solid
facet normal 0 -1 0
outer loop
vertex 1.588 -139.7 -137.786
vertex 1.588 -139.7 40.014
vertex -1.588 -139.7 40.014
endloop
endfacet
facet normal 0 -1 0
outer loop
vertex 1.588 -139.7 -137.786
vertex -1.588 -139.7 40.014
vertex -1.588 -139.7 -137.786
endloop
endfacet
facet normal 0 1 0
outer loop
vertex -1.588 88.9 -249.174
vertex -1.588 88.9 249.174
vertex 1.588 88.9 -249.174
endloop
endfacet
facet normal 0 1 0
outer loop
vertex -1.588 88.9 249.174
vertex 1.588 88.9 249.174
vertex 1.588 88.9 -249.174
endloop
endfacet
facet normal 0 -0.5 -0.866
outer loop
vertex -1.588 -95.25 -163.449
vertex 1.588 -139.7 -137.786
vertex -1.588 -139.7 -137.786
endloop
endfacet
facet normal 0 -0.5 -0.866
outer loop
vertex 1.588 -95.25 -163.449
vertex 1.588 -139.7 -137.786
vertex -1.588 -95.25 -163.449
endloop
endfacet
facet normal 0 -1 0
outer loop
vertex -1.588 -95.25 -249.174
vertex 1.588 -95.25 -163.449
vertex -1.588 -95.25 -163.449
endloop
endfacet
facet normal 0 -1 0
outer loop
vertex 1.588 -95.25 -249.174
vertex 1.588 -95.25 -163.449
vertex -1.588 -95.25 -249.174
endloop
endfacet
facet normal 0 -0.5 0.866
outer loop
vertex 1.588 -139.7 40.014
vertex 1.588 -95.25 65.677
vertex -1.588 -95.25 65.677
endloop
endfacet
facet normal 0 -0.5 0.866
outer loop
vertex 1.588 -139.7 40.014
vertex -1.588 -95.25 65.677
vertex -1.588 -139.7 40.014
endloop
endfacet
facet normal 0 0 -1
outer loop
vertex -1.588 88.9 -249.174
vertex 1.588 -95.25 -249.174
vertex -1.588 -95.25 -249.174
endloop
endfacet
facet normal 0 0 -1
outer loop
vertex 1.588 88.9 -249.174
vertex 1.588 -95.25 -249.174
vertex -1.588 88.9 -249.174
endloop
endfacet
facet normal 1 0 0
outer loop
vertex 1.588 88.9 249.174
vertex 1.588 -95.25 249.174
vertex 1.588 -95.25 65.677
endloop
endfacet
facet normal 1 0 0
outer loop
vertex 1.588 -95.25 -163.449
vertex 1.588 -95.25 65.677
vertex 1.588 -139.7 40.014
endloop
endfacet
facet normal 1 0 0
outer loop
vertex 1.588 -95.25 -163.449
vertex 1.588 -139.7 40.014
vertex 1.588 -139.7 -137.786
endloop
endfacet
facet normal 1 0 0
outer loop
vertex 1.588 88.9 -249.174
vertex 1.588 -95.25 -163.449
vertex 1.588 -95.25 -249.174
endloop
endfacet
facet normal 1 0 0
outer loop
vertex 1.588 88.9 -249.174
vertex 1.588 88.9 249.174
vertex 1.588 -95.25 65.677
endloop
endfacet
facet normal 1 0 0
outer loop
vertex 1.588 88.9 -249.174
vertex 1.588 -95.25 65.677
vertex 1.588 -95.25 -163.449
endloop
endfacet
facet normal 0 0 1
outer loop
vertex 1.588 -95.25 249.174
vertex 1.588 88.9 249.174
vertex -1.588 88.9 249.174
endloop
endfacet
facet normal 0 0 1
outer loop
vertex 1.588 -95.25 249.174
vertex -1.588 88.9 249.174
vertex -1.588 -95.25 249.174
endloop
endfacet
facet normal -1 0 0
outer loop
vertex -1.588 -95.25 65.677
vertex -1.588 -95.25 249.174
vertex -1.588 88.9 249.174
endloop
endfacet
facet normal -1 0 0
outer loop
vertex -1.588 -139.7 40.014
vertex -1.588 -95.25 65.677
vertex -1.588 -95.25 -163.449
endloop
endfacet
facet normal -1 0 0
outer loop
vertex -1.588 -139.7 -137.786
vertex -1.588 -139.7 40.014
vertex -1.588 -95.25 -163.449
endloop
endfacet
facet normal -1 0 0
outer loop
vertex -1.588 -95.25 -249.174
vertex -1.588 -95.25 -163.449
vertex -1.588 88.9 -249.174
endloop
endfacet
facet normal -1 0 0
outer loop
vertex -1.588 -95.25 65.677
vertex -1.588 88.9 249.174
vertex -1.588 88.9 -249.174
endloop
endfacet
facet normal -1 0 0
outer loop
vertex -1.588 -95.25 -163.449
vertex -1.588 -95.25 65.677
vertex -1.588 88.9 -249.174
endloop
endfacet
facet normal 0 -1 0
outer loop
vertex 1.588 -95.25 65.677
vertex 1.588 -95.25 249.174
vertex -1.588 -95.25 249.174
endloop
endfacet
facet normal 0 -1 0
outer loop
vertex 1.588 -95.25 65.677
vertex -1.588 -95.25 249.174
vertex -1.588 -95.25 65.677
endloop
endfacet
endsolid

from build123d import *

# Parameters (mm, degrees)
SKETCH1_W           = 498.348
SKETCH1_H           = 177.8
BOSS_EXTRUDE1_DEPTH = 1.5875
BOSS_EXTRUDE2_DEPTH = 3.175


with BuildPart() as part:
    # Sketch1 → Boss-Extrude1 (new, symmetric)
    with BuildSketch(Plane(origin=(0, 0, 0), x_dir=(0, 0, -1), z_dir=(1, 0, 0))):
        Rectangle(SKETCH1_W, SKETCH1_H)
    extrude(amount=BOSS_EXTRUDE1_DEPTH, both=True)

    # Sketch2 → Boss-Extrude2 (add)
    with BuildSketch(Plane(origin=(1.5875, 0, 0), x_dir=(0, 0, -1), z_dir=(1, 0, 0))):
        Polygon((249.174, -95.25), (249.174, -88.9), (-249.174, -88.9), (-249.174, -95.25), (-65.677438931, -95.25), (-40.014219465, -139.7), (137.785780535, -139.7), (163.449, -95.25), align=None)
    extrude(amount=-BOSS_EXTRUDE2_DEPTH)


solid = part.part
